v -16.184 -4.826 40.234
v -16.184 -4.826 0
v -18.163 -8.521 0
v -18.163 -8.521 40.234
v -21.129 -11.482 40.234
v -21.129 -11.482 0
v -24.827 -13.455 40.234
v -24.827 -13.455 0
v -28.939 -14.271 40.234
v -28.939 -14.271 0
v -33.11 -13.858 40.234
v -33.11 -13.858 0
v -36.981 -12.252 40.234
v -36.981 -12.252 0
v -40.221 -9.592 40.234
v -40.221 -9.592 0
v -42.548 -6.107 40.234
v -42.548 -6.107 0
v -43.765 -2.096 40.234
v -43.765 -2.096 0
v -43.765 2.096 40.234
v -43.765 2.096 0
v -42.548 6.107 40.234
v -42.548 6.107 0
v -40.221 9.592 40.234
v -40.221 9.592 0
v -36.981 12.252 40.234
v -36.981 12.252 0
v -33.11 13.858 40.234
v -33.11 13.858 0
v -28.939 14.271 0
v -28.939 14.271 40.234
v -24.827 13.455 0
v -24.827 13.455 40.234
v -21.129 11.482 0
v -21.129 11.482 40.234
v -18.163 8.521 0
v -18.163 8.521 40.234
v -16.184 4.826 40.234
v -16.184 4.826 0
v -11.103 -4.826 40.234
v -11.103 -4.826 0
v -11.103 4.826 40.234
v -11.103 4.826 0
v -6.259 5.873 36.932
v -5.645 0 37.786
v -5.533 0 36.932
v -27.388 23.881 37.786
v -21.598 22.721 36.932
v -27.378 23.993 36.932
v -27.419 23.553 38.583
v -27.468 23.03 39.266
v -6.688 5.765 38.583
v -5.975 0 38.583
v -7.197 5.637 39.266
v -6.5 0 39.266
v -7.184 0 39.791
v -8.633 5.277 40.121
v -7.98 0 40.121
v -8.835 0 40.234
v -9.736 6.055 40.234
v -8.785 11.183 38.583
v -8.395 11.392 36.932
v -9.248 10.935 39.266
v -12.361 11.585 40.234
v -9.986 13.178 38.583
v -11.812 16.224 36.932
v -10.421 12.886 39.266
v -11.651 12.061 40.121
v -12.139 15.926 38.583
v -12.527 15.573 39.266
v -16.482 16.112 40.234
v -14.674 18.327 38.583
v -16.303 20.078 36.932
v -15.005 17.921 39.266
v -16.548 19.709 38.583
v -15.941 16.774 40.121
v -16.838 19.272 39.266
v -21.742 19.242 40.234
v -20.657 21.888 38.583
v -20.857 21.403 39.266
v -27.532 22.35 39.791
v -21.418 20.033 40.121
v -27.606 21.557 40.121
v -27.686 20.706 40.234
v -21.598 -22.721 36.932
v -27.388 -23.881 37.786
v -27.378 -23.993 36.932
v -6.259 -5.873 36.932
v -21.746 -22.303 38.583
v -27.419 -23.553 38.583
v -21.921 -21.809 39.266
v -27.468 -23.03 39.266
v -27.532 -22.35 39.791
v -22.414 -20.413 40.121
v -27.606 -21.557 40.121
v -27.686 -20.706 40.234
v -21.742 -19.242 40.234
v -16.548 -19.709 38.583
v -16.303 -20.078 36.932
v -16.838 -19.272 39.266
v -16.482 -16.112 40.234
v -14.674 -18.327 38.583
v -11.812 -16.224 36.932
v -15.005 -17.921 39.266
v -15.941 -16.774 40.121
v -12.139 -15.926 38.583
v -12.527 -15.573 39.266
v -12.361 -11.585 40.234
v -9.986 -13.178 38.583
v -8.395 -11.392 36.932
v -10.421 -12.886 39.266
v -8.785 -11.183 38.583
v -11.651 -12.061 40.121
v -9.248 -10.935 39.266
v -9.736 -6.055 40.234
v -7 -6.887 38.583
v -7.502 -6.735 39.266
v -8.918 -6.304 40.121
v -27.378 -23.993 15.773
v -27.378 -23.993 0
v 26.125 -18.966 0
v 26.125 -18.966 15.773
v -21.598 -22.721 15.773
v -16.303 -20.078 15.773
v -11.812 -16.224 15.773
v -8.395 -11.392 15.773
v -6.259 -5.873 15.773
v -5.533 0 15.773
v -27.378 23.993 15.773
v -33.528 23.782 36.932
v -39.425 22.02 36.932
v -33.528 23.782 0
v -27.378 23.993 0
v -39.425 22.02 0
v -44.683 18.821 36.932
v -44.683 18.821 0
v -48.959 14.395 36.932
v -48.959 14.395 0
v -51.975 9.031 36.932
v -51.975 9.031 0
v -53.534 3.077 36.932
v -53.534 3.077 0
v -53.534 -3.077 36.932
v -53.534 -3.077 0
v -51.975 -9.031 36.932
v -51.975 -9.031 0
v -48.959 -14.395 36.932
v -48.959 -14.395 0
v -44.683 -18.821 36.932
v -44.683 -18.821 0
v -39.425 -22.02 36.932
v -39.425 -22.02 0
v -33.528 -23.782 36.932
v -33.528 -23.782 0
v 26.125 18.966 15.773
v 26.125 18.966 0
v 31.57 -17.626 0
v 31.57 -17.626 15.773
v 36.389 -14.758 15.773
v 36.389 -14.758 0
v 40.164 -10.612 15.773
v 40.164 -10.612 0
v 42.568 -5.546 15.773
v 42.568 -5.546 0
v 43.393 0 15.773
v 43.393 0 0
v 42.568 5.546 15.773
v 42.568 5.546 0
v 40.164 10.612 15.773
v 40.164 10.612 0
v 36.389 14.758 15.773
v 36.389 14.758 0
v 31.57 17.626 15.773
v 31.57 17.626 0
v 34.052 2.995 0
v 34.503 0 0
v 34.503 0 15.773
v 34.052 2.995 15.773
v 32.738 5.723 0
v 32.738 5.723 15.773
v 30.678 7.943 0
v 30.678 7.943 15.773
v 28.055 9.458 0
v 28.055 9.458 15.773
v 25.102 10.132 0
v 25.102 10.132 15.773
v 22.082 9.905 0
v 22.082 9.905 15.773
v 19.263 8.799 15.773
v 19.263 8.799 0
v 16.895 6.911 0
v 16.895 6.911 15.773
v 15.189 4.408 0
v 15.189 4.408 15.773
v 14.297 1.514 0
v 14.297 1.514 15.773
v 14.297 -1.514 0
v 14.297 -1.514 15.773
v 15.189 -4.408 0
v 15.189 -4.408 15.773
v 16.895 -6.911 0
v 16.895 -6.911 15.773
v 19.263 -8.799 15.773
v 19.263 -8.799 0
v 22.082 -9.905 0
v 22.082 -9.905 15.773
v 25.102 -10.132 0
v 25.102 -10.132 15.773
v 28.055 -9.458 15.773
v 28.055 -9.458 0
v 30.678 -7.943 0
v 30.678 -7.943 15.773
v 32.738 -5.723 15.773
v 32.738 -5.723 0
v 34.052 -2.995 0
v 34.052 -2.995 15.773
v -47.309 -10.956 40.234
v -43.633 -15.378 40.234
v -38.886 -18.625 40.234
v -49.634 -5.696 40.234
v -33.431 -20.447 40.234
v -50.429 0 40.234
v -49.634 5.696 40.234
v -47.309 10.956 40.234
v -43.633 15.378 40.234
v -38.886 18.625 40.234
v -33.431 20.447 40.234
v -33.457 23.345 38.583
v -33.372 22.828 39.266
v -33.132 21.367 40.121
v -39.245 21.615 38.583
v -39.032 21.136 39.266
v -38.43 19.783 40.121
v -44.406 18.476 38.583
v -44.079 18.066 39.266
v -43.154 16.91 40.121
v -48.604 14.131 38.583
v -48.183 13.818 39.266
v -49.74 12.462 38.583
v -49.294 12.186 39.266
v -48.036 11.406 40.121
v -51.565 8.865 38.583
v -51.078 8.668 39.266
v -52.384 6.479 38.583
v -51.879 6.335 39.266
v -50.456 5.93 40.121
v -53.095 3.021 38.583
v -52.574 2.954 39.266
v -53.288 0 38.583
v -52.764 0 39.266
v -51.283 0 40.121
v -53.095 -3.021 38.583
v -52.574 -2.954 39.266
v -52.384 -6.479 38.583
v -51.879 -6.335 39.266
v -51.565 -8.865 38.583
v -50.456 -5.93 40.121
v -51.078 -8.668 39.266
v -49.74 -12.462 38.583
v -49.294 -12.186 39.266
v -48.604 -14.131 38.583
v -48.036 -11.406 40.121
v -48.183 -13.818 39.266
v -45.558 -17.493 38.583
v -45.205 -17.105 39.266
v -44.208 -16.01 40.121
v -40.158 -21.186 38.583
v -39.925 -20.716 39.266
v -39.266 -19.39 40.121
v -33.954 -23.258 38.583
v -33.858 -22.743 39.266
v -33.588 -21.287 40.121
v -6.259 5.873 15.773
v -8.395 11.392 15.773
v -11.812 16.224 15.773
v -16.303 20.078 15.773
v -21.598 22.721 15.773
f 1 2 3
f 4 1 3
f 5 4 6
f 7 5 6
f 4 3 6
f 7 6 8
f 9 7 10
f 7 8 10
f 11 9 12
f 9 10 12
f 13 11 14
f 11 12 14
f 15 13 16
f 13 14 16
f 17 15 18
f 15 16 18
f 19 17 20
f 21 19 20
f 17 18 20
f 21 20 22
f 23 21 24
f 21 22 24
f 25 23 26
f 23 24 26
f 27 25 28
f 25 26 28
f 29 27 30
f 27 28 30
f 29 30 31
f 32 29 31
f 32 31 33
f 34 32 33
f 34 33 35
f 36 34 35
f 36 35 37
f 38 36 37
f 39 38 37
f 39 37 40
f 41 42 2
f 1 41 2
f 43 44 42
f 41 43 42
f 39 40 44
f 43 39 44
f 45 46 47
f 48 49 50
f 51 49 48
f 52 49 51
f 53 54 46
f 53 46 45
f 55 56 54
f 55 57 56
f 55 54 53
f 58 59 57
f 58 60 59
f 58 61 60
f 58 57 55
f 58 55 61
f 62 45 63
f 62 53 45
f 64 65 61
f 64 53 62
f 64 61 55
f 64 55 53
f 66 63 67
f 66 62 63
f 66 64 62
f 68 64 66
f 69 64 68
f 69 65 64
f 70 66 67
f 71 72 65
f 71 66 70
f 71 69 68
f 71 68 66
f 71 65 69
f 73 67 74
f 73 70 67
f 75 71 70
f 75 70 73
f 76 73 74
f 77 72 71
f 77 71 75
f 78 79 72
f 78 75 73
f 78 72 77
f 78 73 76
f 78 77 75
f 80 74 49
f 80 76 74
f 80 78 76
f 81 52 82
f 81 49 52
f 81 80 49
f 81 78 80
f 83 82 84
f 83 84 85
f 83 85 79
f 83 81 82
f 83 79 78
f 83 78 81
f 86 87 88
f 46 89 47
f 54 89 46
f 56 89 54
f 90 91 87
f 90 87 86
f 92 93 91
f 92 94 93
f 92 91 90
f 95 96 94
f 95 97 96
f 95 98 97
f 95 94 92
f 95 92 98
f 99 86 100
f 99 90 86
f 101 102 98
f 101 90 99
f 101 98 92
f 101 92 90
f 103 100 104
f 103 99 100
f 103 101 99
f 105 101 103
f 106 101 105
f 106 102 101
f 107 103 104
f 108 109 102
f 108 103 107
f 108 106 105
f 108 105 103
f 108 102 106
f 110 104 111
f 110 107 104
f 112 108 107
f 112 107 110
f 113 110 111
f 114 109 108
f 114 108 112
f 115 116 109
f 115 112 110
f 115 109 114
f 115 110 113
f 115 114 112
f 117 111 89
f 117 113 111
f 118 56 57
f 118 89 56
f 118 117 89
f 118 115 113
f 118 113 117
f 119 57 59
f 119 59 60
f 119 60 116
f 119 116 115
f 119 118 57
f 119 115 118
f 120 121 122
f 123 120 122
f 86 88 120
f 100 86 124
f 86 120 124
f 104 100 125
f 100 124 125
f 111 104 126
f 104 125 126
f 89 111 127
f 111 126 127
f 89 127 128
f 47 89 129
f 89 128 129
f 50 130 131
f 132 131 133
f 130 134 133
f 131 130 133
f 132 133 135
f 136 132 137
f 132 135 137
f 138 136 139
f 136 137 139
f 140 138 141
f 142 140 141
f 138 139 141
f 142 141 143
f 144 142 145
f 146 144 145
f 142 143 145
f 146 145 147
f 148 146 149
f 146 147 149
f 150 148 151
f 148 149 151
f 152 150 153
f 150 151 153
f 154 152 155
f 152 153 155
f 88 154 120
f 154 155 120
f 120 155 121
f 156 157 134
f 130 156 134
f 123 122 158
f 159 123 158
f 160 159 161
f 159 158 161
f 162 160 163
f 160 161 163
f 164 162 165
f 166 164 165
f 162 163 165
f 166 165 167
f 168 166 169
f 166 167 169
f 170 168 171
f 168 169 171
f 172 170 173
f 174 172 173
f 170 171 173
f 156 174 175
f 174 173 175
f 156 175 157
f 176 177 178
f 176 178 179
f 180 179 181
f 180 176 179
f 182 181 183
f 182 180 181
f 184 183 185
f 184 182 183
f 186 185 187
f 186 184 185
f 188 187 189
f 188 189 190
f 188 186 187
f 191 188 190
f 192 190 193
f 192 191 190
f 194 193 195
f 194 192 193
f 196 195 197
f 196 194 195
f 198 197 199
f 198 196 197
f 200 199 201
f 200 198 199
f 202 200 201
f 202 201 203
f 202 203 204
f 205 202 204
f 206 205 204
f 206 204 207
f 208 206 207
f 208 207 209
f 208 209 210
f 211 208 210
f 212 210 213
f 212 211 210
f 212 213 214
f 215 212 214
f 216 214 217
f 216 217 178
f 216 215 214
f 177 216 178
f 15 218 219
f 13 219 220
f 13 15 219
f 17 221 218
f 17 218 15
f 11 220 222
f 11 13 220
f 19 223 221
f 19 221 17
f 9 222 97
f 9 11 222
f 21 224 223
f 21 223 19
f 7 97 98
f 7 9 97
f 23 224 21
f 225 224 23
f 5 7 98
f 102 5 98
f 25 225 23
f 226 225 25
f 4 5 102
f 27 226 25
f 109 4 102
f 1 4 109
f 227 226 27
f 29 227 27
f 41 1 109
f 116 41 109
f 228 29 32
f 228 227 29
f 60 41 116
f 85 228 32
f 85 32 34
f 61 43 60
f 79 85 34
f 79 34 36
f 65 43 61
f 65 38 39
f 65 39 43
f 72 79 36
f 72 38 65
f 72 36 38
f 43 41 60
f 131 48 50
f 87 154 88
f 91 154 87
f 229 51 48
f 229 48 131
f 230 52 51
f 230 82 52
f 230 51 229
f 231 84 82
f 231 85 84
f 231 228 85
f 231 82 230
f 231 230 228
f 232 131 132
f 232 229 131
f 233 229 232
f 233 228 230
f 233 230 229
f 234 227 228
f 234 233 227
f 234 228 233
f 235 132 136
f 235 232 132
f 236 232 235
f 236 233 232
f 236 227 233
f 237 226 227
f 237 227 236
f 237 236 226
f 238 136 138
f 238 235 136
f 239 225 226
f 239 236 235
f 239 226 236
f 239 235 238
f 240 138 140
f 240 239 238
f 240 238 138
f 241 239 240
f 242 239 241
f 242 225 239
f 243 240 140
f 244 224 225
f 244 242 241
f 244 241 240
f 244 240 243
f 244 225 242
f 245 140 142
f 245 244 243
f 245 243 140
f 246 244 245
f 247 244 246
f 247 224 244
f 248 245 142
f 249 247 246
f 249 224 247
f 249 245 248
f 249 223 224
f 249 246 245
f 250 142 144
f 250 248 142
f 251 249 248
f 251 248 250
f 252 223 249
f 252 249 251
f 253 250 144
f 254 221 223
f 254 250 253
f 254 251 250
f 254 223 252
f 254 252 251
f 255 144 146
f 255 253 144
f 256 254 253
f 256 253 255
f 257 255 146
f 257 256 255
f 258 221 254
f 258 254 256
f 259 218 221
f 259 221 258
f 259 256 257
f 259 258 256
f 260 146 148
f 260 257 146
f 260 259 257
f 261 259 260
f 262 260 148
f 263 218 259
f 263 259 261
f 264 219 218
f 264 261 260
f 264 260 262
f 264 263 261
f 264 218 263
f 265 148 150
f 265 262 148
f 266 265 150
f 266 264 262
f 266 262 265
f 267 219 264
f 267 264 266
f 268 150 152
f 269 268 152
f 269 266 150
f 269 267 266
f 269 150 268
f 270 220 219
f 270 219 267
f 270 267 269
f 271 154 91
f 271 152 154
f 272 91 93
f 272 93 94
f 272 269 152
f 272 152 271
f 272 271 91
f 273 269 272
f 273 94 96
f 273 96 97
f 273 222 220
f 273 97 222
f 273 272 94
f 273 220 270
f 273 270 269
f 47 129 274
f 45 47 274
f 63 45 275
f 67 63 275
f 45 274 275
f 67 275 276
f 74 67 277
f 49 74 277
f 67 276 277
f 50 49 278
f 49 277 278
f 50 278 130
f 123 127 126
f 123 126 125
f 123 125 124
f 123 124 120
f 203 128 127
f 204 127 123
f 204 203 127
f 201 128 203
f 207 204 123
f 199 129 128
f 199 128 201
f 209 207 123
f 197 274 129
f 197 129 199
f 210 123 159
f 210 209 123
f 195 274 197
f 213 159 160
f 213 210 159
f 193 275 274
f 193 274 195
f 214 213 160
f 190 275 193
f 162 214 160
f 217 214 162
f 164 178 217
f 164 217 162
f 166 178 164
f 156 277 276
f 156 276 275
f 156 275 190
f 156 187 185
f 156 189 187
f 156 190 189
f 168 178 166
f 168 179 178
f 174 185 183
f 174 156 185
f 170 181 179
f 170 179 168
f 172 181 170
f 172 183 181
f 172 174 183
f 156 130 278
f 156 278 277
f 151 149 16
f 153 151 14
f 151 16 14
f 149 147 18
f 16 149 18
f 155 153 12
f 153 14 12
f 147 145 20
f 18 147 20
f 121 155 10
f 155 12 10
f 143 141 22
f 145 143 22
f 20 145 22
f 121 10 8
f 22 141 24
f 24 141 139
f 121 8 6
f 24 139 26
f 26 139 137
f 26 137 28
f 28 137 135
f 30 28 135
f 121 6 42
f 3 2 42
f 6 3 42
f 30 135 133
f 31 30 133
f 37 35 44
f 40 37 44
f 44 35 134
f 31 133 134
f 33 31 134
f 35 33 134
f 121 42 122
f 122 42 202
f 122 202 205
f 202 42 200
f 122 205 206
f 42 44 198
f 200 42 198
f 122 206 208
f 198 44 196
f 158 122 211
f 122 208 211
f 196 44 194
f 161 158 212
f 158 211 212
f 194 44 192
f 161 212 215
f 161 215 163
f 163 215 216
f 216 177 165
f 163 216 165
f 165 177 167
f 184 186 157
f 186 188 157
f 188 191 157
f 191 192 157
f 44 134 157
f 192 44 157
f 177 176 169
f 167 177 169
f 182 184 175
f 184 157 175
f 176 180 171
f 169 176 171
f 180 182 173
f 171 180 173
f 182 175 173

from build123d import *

# Parameters (mm, degrees)
F1_DEPTH = 40.2336
F0_R     = 10.16
F2_DEPTH = 15.7734
F3_R     = 3.302


with BuildPart() as f1:
    # F0 (on Top) → F1 (new body)
    with BuildSketch(Plane.XY):
        with BuildLine():
            ThreePointArc((-27.377507, -23.993331), (-11.81204, -16.223986), (-5.532807, 0))
            ThreePointArc((-5.532807, 0), (-11.81204, 16.223986), (-27.377507, 23.993331))
            ThreePointArc((-27.377507, 23.993331), (-53.730808, 0), (-27.377507, -23.993331))
        make_face()
        with BuildLine():
            ThreePointArc((-16.184043, -4.826), (-43.919307, 0), (-16.184043, 4.826))
            Line((-16.184043, 4.826), (-11.102507, 4.826))
            Line((-11.102507, 4.826), (-11.102507, -4.826))
            Line((-11.102507, -4.826), (-16.184043, -4.826))
        make_face(mode=Mode.SUBTRACT)
    extrude(amount=F1_DEPTH)

    # F0 (on Top) → F2 (join)
    with BuildSketch(Plane.XY):
        with BuildLine():
            ThreePointArc((-27.377507, 23.993331), (-11.81204, 16.223986), (-5.532807, 0))
            ThreePointArc((-5.532807, 0), (-11.81204, -16.223986), (-27.377507, -23.993331))
            Line((-27.377507, -23.993331), (26.125193, -18.96647))
            ThreePointArc((26.125193, -18.96647), (43.393193, 0), (26.125193, 18.96647))
            Line((26.125193, 18.96647), (-27.377507, 23.993331))
        make_face()
        with Locations((24.343193, 0)):
            Circle(F0_R, mode=Mode.SUBTRACT)
    extrude(amount=F2_DEPTH)

    # F3
    f3_edges = [f1.edges().sort_by_distance(p)[0] for p in [
        (-31.886108, 23.993331, 40.2336),
    ]]
    fillet(f3_edges, radius=F3_R)


solid = f1.part
